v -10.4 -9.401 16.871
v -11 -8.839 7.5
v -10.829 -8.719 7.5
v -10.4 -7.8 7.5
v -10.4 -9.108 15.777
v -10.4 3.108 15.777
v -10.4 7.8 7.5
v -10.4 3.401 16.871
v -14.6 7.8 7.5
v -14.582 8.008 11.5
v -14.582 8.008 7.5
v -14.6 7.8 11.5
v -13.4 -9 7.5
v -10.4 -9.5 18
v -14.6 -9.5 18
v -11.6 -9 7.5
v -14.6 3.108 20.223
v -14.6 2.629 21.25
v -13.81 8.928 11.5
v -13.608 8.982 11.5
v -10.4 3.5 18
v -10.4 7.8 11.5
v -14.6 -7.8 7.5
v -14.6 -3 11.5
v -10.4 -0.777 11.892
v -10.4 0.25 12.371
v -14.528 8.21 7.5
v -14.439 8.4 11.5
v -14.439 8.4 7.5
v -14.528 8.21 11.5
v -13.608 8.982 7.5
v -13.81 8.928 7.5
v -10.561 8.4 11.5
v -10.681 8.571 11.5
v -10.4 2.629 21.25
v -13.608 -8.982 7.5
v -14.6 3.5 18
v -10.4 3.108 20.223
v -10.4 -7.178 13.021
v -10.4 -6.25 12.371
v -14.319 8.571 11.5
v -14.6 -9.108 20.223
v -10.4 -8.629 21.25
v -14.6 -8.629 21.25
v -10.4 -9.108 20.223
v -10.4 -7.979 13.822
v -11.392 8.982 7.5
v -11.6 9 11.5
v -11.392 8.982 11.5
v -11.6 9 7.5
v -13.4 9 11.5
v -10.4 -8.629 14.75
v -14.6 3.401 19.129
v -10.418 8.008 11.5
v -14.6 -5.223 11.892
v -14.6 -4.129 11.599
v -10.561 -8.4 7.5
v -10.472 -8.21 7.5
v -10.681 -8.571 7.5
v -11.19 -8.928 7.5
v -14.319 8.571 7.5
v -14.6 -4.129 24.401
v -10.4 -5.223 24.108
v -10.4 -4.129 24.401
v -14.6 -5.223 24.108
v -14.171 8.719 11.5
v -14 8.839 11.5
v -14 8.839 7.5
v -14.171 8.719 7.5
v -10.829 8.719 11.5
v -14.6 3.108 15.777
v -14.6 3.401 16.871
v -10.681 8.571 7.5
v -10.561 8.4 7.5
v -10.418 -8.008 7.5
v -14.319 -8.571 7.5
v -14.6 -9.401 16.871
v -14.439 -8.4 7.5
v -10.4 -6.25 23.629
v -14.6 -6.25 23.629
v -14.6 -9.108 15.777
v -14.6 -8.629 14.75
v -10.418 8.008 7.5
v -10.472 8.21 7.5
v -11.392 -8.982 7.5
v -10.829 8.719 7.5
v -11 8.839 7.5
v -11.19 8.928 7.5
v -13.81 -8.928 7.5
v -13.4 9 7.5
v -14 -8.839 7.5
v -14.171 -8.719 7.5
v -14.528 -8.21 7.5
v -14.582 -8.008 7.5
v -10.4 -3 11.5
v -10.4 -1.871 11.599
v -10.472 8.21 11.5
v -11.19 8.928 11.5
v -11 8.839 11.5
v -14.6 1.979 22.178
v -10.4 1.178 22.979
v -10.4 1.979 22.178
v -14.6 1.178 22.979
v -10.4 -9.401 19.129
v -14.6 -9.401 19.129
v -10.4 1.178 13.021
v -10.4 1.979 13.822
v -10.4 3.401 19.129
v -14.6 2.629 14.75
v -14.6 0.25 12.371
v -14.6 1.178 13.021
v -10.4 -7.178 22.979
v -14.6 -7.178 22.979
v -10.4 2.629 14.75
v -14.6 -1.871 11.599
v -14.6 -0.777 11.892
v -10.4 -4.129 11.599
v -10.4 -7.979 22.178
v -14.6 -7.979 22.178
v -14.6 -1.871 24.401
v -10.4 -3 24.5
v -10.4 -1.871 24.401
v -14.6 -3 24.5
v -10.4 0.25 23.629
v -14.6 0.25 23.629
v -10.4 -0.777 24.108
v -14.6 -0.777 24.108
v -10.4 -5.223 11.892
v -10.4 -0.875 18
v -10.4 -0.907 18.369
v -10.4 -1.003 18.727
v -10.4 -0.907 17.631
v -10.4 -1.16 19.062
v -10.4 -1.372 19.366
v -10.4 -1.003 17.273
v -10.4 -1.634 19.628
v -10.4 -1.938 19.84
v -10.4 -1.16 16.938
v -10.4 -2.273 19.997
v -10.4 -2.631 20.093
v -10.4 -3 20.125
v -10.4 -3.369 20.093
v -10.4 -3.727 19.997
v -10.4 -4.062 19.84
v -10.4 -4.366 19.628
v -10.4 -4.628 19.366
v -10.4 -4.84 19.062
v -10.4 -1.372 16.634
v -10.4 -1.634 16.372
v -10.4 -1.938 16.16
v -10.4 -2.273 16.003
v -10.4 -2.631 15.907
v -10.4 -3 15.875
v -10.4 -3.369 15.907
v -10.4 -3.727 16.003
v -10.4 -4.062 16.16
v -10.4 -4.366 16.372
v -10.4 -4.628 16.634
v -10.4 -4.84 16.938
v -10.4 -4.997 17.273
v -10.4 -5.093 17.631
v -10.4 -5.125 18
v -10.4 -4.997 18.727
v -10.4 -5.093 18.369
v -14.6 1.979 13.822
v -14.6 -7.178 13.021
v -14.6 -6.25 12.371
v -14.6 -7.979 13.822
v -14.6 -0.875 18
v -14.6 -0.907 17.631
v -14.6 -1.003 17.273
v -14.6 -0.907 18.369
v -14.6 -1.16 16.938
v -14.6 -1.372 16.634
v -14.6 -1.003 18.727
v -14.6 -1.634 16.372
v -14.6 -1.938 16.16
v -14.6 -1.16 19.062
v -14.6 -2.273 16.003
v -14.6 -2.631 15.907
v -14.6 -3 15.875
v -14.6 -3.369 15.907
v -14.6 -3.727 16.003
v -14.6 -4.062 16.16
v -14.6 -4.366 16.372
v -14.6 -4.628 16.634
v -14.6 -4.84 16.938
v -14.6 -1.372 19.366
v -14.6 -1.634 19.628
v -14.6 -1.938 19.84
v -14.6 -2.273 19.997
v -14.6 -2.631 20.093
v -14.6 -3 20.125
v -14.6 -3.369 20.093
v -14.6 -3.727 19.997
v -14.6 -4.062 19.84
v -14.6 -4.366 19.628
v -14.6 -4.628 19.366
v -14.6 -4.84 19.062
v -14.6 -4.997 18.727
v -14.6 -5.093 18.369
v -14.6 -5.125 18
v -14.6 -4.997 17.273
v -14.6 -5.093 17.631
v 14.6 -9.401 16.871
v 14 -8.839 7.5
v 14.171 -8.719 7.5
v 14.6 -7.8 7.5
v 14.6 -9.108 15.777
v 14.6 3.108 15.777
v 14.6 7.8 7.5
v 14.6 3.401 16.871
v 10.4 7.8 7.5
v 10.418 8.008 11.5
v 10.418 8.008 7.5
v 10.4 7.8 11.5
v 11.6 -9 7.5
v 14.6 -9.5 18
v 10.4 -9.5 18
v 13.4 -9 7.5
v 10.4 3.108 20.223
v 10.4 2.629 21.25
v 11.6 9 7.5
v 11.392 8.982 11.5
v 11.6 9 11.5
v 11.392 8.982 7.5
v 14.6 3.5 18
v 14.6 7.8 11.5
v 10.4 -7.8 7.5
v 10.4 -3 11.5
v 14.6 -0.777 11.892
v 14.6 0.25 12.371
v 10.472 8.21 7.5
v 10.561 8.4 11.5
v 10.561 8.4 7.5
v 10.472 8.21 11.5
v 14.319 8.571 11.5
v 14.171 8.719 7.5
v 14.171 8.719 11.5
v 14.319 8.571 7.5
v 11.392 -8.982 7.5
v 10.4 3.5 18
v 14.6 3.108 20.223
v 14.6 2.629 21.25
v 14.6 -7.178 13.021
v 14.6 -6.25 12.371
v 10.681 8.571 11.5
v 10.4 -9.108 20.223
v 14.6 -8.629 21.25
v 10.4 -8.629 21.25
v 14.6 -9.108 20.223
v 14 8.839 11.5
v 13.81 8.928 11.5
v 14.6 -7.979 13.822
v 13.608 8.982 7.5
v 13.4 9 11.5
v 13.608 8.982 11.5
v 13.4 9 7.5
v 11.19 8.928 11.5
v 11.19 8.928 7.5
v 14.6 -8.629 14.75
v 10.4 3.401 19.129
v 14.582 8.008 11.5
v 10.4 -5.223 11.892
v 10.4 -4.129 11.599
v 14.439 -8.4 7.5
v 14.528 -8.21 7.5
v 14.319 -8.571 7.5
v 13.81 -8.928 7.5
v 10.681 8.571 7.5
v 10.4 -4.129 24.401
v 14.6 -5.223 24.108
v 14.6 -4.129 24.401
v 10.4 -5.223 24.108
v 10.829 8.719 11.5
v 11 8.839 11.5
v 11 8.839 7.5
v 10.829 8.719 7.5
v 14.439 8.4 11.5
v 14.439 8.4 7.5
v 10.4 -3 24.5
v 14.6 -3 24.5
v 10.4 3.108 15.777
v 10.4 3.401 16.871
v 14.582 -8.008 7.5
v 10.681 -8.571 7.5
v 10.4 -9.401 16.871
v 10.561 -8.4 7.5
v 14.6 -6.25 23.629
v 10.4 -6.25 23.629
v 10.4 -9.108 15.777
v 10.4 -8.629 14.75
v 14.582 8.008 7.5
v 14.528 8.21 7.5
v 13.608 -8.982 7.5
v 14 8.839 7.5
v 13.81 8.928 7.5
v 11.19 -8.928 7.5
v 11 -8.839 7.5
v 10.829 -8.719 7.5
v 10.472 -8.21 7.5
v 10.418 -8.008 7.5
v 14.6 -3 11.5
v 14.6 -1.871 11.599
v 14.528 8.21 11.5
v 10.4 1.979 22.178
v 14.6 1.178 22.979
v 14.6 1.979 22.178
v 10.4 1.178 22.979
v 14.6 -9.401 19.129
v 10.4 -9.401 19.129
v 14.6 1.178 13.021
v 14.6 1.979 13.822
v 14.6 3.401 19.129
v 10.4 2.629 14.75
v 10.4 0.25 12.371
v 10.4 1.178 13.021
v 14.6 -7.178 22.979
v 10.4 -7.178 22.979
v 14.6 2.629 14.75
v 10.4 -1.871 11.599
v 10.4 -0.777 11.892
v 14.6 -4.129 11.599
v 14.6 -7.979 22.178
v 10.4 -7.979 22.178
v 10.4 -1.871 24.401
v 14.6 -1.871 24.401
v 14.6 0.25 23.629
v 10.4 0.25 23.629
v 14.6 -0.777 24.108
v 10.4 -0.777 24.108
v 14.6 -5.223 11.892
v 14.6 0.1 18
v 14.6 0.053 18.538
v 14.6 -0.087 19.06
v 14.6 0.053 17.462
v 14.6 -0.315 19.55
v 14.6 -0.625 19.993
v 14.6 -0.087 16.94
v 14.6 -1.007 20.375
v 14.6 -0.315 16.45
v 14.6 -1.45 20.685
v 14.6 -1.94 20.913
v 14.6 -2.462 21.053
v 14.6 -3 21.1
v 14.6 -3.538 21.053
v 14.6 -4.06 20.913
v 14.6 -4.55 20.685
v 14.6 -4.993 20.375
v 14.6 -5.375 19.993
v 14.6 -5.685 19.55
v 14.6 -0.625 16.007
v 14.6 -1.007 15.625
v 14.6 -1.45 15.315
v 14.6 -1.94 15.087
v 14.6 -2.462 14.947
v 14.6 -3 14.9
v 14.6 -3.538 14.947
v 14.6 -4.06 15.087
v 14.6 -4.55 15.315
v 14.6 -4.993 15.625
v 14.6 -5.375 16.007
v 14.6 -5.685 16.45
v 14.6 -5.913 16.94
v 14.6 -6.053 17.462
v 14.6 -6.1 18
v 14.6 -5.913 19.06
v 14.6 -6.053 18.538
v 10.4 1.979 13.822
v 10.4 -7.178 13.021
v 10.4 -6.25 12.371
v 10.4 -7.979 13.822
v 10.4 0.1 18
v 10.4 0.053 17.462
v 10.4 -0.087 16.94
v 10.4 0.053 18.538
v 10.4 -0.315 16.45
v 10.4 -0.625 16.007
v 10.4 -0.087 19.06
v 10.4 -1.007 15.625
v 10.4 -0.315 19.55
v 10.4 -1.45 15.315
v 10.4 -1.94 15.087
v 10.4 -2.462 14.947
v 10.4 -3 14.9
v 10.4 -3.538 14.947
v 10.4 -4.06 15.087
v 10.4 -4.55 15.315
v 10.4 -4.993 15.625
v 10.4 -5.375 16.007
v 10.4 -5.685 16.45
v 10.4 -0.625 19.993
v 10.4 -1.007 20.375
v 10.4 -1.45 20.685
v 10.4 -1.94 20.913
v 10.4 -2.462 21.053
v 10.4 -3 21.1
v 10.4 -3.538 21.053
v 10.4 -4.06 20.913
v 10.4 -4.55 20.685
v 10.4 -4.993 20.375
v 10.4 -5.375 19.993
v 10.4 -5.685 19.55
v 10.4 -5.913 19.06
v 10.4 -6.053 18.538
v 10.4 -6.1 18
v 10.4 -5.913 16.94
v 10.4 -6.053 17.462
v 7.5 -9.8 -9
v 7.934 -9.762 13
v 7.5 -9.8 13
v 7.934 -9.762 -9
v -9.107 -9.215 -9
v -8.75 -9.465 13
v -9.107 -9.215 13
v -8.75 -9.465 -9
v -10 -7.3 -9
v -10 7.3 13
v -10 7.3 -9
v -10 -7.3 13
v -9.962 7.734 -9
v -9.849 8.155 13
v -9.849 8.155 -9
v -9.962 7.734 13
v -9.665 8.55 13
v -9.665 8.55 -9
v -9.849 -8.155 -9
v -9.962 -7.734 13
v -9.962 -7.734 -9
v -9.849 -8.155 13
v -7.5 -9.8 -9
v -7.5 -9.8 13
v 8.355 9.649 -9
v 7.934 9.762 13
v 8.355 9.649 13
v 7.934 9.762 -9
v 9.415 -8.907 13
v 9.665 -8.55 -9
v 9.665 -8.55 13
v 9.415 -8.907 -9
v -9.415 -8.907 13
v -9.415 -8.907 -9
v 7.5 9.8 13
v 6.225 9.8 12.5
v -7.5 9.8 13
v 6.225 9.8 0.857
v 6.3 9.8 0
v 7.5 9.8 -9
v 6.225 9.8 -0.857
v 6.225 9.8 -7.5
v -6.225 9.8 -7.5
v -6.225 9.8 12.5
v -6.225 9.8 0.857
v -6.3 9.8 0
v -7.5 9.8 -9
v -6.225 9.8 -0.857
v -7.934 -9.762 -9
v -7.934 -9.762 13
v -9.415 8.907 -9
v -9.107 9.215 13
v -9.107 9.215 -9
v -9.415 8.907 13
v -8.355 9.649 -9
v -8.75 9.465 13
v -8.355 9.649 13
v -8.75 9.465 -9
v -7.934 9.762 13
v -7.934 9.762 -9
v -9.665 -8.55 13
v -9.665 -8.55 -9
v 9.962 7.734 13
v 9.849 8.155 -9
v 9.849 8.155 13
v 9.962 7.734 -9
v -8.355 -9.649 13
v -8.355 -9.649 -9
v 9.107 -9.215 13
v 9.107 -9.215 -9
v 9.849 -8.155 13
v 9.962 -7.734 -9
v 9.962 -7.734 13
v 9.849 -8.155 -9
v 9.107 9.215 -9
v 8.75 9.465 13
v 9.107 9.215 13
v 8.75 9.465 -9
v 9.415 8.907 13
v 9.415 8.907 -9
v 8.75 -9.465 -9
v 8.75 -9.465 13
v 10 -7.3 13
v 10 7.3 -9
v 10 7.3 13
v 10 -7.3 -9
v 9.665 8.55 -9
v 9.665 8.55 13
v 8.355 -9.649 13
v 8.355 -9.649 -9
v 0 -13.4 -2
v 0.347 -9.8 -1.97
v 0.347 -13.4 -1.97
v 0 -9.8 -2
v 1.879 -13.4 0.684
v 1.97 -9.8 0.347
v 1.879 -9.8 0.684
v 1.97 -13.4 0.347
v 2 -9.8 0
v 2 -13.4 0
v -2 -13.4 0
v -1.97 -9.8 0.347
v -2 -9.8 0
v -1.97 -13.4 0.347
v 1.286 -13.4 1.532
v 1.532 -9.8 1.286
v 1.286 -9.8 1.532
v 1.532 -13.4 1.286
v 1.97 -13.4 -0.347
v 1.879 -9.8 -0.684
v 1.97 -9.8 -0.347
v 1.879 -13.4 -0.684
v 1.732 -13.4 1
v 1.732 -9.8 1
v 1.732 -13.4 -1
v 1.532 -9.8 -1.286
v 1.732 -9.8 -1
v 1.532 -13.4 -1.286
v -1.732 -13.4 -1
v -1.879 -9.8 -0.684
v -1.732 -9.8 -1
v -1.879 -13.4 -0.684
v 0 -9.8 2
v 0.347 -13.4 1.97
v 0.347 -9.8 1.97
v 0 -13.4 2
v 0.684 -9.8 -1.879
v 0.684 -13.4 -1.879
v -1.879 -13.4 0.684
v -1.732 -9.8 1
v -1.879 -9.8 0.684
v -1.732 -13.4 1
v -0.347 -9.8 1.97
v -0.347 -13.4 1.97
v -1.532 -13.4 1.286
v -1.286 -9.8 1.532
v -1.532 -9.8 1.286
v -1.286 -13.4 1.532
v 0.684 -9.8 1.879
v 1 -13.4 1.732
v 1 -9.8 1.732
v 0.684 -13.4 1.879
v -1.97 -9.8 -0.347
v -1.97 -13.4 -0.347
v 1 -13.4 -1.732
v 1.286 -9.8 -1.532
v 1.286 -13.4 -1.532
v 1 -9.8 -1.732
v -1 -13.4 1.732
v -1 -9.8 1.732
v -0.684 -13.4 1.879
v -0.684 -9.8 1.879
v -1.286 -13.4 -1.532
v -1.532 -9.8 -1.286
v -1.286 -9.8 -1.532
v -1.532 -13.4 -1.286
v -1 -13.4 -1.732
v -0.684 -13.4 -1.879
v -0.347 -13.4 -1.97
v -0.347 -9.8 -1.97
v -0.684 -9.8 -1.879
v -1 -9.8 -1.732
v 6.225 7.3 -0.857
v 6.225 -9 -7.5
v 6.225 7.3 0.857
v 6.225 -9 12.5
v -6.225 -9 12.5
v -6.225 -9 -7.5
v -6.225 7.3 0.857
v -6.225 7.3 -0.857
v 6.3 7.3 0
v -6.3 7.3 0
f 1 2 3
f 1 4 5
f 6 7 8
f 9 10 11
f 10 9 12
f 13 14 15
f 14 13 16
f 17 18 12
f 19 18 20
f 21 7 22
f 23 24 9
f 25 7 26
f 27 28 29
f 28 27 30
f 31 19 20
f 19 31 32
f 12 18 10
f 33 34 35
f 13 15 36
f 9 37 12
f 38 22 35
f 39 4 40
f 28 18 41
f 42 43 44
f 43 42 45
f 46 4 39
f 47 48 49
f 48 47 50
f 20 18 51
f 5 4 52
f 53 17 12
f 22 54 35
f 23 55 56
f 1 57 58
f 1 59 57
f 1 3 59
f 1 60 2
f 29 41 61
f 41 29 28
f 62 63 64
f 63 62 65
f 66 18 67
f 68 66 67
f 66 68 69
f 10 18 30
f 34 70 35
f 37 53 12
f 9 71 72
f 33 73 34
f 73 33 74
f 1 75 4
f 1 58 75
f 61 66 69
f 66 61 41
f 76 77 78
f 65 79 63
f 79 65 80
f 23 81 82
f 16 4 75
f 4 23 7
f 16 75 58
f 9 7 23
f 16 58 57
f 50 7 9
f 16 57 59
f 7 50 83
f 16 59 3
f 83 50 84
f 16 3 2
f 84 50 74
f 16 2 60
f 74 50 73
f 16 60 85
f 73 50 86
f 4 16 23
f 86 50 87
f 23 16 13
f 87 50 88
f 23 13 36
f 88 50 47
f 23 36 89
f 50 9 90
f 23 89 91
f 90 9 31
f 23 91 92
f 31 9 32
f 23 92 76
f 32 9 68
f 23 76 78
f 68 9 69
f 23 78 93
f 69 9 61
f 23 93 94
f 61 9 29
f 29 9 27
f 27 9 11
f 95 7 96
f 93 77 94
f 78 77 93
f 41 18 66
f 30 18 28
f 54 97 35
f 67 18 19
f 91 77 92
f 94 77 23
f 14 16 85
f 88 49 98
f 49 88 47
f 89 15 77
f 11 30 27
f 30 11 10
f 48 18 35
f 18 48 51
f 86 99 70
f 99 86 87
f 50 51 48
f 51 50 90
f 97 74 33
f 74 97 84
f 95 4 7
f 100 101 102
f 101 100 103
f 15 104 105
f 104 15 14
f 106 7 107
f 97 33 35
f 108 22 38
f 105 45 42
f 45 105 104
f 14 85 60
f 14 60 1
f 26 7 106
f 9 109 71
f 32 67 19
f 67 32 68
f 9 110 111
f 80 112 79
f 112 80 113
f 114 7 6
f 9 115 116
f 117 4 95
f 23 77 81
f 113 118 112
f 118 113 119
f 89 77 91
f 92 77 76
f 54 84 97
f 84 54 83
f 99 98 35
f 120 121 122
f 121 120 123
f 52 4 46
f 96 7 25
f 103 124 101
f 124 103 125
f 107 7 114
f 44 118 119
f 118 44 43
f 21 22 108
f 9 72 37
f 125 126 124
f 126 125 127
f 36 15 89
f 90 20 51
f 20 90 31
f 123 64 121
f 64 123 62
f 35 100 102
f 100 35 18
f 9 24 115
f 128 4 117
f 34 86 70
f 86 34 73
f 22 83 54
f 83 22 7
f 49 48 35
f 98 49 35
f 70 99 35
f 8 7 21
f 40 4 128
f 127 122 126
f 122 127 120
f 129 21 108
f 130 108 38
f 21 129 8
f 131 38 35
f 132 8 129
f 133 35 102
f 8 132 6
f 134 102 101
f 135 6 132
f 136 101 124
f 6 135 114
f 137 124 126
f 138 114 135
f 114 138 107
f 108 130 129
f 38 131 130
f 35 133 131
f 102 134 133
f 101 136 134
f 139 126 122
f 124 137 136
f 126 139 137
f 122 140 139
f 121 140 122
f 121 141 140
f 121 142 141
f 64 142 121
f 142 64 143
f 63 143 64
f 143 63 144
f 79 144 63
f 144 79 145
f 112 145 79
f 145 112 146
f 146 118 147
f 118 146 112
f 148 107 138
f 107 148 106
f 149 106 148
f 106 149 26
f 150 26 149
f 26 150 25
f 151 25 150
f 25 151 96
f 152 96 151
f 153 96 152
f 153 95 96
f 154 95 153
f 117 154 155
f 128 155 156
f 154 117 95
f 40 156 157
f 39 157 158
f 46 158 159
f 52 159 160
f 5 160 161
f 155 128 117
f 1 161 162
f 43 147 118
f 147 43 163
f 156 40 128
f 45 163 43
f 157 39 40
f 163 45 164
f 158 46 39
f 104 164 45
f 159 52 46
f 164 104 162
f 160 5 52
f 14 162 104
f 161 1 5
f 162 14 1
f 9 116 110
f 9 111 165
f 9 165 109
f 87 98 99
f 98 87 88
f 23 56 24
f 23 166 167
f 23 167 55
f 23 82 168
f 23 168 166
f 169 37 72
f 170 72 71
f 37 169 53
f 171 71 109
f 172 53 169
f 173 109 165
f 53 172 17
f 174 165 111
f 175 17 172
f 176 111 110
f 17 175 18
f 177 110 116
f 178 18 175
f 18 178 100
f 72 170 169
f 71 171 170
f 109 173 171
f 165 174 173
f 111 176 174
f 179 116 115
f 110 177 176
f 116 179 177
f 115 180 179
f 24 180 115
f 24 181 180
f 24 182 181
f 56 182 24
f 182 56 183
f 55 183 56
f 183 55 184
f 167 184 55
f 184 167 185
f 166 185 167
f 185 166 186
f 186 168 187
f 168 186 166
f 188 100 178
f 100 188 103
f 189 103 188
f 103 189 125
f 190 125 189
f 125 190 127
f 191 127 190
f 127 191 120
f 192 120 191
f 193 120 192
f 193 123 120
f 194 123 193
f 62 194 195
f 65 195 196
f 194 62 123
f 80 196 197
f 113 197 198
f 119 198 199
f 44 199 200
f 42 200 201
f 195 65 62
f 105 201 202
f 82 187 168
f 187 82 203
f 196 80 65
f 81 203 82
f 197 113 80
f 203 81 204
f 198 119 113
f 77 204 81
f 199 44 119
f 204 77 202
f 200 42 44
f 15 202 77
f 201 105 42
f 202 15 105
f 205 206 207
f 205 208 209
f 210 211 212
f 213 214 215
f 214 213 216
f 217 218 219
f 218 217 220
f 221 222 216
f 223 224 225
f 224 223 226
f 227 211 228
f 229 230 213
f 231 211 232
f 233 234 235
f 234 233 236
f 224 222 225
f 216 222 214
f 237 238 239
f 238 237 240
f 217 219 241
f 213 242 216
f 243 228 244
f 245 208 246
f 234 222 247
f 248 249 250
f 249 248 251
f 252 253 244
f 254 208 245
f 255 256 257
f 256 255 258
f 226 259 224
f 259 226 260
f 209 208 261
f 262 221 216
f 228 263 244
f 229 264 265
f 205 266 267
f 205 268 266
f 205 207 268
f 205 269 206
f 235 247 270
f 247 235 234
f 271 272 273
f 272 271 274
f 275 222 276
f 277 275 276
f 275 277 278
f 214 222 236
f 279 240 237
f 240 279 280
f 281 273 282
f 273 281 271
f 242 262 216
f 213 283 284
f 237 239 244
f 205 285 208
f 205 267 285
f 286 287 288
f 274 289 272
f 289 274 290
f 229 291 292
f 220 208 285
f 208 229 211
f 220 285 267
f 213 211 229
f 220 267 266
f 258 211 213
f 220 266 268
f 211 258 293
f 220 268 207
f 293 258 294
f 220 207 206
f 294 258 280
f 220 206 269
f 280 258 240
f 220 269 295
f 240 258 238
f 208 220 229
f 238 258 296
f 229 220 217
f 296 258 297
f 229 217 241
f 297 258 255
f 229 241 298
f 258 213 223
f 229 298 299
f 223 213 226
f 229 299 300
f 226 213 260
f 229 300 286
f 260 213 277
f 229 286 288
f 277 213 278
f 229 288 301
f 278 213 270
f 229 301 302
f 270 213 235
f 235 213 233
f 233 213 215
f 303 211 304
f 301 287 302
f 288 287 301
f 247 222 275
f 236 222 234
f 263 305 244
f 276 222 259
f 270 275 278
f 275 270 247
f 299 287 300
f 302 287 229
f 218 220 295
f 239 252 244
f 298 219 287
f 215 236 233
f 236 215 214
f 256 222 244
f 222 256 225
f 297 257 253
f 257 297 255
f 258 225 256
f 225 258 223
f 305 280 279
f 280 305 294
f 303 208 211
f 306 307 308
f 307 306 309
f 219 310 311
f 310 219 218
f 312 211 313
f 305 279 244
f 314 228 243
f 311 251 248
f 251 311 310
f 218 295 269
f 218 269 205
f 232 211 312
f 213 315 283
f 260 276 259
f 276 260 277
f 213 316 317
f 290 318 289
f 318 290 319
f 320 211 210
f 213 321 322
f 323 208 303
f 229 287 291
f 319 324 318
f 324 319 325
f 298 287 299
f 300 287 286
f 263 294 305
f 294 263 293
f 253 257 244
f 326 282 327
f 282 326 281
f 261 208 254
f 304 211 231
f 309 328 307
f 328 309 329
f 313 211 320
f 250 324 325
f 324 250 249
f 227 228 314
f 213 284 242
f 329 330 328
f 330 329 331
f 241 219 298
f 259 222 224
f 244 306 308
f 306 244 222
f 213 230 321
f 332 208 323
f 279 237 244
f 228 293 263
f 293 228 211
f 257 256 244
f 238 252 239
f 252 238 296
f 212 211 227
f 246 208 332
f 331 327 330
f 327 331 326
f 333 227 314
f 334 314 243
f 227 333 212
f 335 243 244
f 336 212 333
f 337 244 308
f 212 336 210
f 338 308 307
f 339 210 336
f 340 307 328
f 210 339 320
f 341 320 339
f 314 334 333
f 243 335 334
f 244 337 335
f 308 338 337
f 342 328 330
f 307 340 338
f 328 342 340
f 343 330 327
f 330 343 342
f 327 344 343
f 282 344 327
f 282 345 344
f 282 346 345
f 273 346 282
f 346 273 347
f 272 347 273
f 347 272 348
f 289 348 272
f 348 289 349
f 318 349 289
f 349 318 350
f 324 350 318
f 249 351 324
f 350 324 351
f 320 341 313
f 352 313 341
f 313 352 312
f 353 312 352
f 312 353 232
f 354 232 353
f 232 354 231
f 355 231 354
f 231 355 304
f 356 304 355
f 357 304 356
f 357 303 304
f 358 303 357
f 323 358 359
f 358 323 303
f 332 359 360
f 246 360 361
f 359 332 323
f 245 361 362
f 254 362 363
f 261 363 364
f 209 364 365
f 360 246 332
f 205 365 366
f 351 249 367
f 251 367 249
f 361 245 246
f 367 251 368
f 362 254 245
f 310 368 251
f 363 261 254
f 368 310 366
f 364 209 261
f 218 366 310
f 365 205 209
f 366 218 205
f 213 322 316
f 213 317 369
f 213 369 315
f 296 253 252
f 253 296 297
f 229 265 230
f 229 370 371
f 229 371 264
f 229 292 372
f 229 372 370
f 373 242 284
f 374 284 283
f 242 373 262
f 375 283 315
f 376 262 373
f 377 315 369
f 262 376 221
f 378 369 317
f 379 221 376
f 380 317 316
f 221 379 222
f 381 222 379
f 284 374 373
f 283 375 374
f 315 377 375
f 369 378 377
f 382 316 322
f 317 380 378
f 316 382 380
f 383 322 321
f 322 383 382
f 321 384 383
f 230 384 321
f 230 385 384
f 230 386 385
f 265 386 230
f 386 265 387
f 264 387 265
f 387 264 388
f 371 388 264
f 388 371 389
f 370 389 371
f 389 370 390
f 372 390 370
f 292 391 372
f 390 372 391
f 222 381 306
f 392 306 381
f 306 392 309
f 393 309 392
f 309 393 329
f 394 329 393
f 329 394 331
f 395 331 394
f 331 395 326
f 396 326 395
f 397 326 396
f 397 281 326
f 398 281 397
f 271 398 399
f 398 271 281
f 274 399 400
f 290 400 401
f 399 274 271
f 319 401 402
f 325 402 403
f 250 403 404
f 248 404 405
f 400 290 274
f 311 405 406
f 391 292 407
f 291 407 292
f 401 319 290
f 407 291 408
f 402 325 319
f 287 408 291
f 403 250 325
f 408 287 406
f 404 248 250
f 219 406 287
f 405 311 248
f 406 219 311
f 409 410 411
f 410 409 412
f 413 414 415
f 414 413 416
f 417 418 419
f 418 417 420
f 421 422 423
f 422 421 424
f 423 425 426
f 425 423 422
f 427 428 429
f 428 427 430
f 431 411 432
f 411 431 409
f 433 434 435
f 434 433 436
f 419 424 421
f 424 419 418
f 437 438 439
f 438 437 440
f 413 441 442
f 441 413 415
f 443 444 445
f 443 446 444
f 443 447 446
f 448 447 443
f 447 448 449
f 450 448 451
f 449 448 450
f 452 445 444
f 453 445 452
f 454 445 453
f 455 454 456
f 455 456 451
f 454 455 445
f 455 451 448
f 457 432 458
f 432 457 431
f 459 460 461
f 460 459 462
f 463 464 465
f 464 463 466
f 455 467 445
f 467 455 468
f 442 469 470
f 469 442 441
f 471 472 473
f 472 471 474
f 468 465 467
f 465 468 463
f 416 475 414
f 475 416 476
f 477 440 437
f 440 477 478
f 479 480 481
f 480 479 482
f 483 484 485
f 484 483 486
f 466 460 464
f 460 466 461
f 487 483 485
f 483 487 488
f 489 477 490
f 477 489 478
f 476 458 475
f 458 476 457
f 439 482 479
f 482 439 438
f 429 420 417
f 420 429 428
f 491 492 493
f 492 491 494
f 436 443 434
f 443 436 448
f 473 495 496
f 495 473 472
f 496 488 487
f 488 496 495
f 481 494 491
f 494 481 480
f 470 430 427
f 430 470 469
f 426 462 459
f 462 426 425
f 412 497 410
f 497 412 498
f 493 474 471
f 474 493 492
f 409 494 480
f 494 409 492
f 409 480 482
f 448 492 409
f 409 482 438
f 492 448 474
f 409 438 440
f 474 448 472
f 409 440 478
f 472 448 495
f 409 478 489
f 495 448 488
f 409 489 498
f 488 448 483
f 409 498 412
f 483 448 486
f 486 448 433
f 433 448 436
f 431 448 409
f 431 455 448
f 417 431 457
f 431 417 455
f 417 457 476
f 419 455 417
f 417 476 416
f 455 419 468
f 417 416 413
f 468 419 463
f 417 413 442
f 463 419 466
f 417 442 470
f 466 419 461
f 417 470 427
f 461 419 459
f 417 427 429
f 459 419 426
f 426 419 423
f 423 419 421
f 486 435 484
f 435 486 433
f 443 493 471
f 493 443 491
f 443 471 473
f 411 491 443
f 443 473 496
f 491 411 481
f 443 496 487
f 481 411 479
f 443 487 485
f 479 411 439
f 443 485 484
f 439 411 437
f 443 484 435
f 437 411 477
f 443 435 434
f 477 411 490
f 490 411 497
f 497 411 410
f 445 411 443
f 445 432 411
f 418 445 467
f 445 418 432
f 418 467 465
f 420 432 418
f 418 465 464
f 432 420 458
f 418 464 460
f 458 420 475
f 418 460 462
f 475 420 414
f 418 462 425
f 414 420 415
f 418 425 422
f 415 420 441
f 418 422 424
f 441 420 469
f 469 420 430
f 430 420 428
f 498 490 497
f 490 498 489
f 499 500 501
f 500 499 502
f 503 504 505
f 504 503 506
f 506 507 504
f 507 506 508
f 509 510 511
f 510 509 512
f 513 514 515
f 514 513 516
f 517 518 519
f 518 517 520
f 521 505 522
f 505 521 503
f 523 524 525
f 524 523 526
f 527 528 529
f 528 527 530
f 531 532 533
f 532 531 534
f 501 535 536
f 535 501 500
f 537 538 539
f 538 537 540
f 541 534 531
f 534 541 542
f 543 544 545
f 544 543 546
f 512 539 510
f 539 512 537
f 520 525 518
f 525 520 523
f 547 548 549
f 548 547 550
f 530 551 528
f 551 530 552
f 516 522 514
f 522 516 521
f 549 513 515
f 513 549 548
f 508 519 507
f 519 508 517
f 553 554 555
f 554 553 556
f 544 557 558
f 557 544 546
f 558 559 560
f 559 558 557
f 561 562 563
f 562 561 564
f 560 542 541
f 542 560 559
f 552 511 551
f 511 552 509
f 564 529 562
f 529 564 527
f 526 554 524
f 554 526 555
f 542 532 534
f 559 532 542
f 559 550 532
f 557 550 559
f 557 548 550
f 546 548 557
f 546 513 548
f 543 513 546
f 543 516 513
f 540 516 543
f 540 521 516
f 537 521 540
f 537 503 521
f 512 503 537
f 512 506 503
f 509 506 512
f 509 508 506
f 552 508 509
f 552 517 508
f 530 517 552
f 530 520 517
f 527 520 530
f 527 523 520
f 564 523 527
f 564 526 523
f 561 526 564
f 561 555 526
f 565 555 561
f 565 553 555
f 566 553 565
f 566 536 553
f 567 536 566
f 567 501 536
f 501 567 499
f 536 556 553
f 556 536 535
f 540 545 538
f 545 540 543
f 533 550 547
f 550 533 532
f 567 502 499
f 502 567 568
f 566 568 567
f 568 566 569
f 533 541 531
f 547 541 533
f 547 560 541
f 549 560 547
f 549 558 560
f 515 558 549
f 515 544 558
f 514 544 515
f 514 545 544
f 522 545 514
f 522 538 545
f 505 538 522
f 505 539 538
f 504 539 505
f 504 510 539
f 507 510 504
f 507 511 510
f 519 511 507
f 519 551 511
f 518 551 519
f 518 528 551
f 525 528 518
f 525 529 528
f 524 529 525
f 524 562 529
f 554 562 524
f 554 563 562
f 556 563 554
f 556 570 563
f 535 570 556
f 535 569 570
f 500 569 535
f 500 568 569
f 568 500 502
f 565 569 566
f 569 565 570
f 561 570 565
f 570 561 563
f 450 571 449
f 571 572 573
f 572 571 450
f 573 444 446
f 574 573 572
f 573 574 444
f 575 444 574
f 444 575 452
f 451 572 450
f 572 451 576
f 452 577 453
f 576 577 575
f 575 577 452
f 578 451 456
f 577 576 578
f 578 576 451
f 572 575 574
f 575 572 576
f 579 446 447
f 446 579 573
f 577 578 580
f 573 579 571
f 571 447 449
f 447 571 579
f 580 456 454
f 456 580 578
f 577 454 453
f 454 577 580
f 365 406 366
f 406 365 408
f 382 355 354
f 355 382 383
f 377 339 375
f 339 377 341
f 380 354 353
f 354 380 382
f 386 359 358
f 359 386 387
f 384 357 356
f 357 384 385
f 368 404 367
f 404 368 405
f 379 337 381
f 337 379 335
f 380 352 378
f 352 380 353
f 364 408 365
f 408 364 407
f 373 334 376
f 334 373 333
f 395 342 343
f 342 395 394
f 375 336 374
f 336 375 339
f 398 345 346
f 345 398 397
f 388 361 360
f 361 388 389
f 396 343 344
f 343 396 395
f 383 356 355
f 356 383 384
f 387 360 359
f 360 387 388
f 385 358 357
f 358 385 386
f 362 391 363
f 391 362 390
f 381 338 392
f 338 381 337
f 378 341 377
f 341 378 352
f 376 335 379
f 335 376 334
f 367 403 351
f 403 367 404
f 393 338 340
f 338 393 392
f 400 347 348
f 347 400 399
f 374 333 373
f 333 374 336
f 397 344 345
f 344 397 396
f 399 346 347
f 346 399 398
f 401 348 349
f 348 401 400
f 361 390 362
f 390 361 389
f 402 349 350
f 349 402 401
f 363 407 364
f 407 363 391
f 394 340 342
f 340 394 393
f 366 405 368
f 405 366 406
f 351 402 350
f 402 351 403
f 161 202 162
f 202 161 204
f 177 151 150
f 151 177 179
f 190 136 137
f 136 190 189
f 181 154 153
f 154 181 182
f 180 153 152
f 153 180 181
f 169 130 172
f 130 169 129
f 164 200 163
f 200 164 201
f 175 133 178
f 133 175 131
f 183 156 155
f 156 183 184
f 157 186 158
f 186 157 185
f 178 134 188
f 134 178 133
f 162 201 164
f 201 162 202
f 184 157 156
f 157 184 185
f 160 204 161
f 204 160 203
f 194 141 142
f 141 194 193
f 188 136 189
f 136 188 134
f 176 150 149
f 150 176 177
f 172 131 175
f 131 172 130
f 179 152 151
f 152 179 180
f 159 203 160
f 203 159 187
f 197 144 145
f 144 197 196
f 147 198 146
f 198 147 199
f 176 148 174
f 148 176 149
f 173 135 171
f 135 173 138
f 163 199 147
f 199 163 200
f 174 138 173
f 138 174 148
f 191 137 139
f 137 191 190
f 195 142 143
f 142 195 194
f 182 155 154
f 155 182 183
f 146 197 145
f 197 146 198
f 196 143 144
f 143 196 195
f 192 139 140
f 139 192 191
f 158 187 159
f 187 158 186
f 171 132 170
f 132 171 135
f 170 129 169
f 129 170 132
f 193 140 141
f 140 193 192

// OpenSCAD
// file: ../rnv1_params.scad
// RNV1 (Robotic Neural Vector 1) - Master Parametric Mechanical Specification
// Units: millimeters (mm)
// Coordinate Frame: +X Forward, +Y Left, +Z Up (Standing Neutral Pose, Floor = Z=0)

$fn = 36;

// --- FDM 3D Print Engineering Tolerances (0.4mm nozzle, PETG / PLA+) ---
WALL_T       = 2.0;    // Primary structural wall thickness (>= 1.6mm requirement)
RIB_T        = 1.8;    // Structural stiffening rib thickness
CLEARANCE    = 0.25;   // Standard FDM press/slip fit clearance
M2_PILOT_D   = 1.75;   // M2 self-tapping pilot hole diameter
M2_CLEAR_D   = 2.3;    // M2 through clearance hole diameter
PIVOT_BOSS_D = 4.0;    // Dual-shear opposing coaxial pivot pin diameter

// --- MG90S Metal-Gear Micro Servo Envelope (TowerPro/Generic standard) ---
MG90S_L      = 22.8;   // Body length along flange axis
MG90S_W      = 12.2;   // Body width
MG90S_H      = 28.5;   // Total housing height (bottom to top gear dome)
MG90S_FLANGE_L = 32.2; // Mounting ear span
MG90S_HOLE_DX  = 27.6; // Mounting hole center-to-center
MG90S_SHAFT_OFF = 5.9; // Output shaft offset from end of 22.8mm body

// --- SG90 9g Micro Servo Envelope ---
SG90_L       = 22.5;
SG90_W       = 12.0;
SG90_H       = 22.5;

// --- Master Kinematic Skeleton Coordinates (mm, Z from Floor = 0) ---
SOLE_PAD_H   = 2.0;    // 2mm silicone anti-slip pad (1mm recessed)
FOOT_L       = 72.0;   // X: -32mm heel to +40mm toe
FOOT_HEEL_X  = -32.0;
FOOT_TOE_X   = 40.0;
FOOT_W       = 46.0;   // Y width per foot
FOOT_PLATE_H = 6.5;    // Rigid foot sole plate thickness

FOOT_Y_CTR   = 26.0;   // Left=+26mm, Right=-26mm (6mm gap between inner edges!)
HIP_ROLL_Y   = 23.0;   // Left=+23mm, Right=-23mm

Z_ANKLE_ROLL = 18.0;   // Ankle roll axis height
Z_KNEE_PITCH = 62.0;   // Knee pitch axis height  (L_shin = 44.0mm)
Z_HIP_PITCH  = 106.0;  // Hip pitch axis height   (L_thigh = 44.0mm)
Z_HIP_ROLL   = 124.0;  // Hip roll axis height    (dZ = 18.0mm)

L_SHIN       = Z_KNEE_PITCH - Z_ANKLE_ROLL; // 44.0 mm
L_THIGH      = Z_HIP_PITCH - Z_KNEE_PITCH;  // 44.0 mm
L_HIP_CLEVIS = Z_HIP_ROLL - Z_HIP_PITCH;    // 18.0 mm

// --- Torso & Pelvis Envelope ---
TORSO_Z_BOT  = 116.0;
TORSO_Z_TOP  = 184.0;
TORSO_H      = TORSO_Z_TOP - TORSO_Z_BOT;   // 68.0 mm
TORSO_W      = 80.0;   // Y: -40 to +40mm
TORSO_D      = 54.0;   // X: -27 to +27mm

// --- Arms ---
SHOULDER_Y   = 46.0;   // Left=+46mm, Right=-46mm
SHOULDER_Z   = 170.0;
ARM_LEN      = 72.0;   // Shoulder to palm tip

// --- 2-DOF Active Spatial Head ---
Z_HEAD_YAW   = 188.0;  // Pan axis Z
Z_HEAD_PITCH = 204.0;  // Tilt axis Z
HEAD_W       = 58.0;   // Y width
HEAD_D       = 44.0;   // X depth
HEAD_H       = 42.0;   // Z height (Z = 196..238mm -> Total Robot Height = 238mm)
HEAD_Z_CTR   = 217.0;

// --- Utility Rounded Box Module ---
module rbox(size, r=2.0, center=true) {
    sx = size[0]; sy = size[1]; sz = size[2];
    rc = min(r, sx/2 - 0.1, sy/2 - 0.1, sz/2 - 0.1);
    translate(center ? [0,0,0] : [sx/2, sy/2, sz/2])
    hull() {
        for (dx = [-sx/2 + rc, sx/2 - rc])
        for (dy = [-sy/2 + rc, sy/2 - rc])
        for (dz = [-sz/2 + rc, sz/2 - rc])
            translate([dx, dy, dz]) sphere(r=rc, $fn=16);
    }
}

module rbox_xy(size, r=2.5, center=true) {
    sx = size[0]; sy = size[1]; sz = size[2];
    rc = min(r, sx/2 - 0.1, sy/2 - 0.1);
    translate(center ? [0,0,0] : [sx/2, sy/2, sz/2])
    linear_extrude(height=sz, center=true)
    offset(r=rc) offset(r=-rc)
        square([sx, sy], center=true);
}
// main file
// RNV1 Part: Hip Roll-to-Pitch Clevis (Connects Hip Roll at Z=+18mm to Hip Pitch at Z=0)
// Local Origin: Hip Pitch axis at (0, 0, 0), Hip Roll axis at (0, -3mm [for L], +18mm)
include <../rnv1_params.scad>

module hip_clevis(side = 1) {
    // side = +1 for Left leg, -1 for Right leg
    y_roll = -side * (FOOT_Y_CTR - HIP_ROLL_Y); // -3mm for Left, +3mm for Right
    difference() {
        union() {
            // Lower Hip Pitch MG90S housing (shaft along +Y at Z=0)
            translate([0, 0, 2.0])
                rbox_xy([20.0, 19.6, 22.0], r=2.5, center=true);

            // Opposing coaxial dual-shear pivot boss at Y = -9.8mm (for Left)
            translate([0, -9.8, 0])
                rotate([90, 0, 0])
                    cylinder(d=PIVOT_BOSS_D, h=3.6);

            // Upper Dual-Shear Hip Roll Clevis Bridge (connects to Pelvis Hip Roll MG90S at Z=+18mm)
            for (sx = [-12.5, 12.5]) {
                hull() {
                    translate([sx, 0, 9.5])
                        rbox_xy([4.2, 18.0, 4.0], r=1.2, center=true);
                    translate([sx, y_roll, L_HIP_CLEVIS])
                        rotate([0, 90, 0])
                            cylinder(d=13.0, h=4.2, center=true);
                }
            }
        }

        // MG90S Hip Pitch Servo Pocket
        translate([0, 0.4, 2.5])
            cube([MG90S_W + CLEARANCE, 18.8, 20.0], center=true);
        translate([0, 9.8, 0])
            rotate([90, 0, 0])
                cylinder(d=12.6, h=5.0, center=true);

        // Hip Roll Clevis Bores (front +X = servo horn, rear -X = opposing pivot boss)
        translate([12.5, y_roll, L_HIP_CLEVIS])
            rotate([0, 90, 0])
                cylinder(d=6.2, h=8.0, center=true);
        translate([-12.5, y_roll, L_HIP_CLEVIS])
            rotate([0, 90, 0])
                cylinder(d=PIVOT_BOSS_D + CLEARANCE, h=8.0, center=true);
    }
}

hip_clevis(1);
